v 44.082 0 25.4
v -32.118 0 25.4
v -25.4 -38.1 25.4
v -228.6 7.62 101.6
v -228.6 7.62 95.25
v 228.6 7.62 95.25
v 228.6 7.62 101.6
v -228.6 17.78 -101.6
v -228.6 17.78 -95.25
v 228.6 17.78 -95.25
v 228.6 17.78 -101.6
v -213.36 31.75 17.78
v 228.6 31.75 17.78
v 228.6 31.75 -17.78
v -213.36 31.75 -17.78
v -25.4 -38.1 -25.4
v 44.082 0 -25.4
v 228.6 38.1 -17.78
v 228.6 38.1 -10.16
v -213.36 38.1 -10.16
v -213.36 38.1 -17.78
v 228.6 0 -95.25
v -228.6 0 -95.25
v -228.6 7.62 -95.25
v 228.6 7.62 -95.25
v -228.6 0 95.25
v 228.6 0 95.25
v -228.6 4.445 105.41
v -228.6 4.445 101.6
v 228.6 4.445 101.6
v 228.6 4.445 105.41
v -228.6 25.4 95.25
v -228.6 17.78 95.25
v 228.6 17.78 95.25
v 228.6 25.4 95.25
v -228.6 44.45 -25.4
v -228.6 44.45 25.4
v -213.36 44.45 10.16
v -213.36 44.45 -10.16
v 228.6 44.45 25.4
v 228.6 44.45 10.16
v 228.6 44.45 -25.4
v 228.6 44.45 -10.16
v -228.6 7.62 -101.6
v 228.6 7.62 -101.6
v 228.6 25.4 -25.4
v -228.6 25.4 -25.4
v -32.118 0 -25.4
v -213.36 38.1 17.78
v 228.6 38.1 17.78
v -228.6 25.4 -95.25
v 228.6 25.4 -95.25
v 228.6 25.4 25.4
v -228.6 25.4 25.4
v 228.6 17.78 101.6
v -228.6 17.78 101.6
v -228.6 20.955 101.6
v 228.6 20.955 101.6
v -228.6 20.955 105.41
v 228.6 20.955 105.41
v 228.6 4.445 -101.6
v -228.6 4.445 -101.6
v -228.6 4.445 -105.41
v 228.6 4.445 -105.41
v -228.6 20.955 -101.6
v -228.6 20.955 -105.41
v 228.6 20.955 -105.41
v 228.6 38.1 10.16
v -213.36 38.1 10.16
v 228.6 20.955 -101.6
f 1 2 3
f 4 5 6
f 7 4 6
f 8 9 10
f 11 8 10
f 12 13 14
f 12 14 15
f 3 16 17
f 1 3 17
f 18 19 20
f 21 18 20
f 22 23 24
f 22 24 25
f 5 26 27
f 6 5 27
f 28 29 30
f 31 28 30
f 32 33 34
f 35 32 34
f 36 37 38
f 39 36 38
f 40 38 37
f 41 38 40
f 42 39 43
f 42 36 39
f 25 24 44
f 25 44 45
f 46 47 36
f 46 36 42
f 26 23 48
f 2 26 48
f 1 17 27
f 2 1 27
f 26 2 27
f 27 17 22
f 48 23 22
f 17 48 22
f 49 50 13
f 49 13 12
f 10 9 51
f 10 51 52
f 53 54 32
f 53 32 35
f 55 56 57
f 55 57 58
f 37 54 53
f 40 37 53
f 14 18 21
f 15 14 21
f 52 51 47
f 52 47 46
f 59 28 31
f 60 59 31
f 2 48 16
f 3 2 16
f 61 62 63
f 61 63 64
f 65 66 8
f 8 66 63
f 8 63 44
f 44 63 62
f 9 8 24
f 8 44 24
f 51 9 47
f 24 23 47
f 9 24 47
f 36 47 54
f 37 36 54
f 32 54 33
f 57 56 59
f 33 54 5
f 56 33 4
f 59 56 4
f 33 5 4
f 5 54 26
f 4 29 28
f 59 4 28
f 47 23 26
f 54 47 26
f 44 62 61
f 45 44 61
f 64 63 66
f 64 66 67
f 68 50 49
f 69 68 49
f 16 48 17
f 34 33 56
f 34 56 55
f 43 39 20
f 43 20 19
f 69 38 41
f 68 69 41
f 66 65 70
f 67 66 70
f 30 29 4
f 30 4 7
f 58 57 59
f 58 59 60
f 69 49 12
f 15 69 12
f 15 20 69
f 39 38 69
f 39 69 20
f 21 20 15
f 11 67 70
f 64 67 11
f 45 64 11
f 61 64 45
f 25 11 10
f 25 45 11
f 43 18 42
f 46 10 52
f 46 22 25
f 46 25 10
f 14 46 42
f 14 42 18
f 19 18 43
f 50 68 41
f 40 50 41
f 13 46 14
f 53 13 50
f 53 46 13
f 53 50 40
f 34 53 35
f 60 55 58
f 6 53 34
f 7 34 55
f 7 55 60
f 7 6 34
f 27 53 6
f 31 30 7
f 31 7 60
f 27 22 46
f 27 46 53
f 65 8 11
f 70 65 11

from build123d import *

# Parameters (mm, degrees)
SKETCH1_W                = 457.2
SKETCH1_H                = 190.5
BOSS_EXTRUDE1_DEPTH      = 25.4
SKETCH2_W                = 457.2
SKETCH2_H                = 10.16
BOSS_EXTRUDE2_DEPTH      = 10.16
BOSS_EXTRUDE3_START      = -13.335
SKETCH3_W                = 457.2
SKETCH3_H                = 3.81
BOSS_EXTRUDE3_DEPTH      = 16.51
SKETCH5_W                = 457.2
SKETCH5_H                = 50.8
BOSS_EXTRUDE4_DEPTH      = 19.05
SKETCH6_W                = 441.96
SKETCH6_H                = 20.32
CUT_EXTRUDE1_DEPTH       = 12.7
CUT_EXTRUDE2_DEPTH       = 27.94
CUT_EXTRUDE2_DEPTH_BACK  = 7.62
SKETCH7_W                = 441.96
SKETCH7_H                = 6.35
BOSS_EXTRUDE5_DEPTH      = 25.4
BOSS_EXTRUDE5_DEPTH_BACK = 25.4


with BuildPart() as part:
    # Sketch1 → Boss-Extrude1 (new body)
    with BuildSketch(Plane(origin=(0, 0, 0), x_dir=(1, 0, 0), z_dir=(0, 1, 0))):
        Rectangle(SKETCH1_W, SKETCH1_H)
    extrude(amount=BOSS_EXTRUDE1_DEPTH)

    # Sketch2 → Boss-Extrude2 (add)
    with BuildSketch(Plane.XY.offset(95.25)):
        with Locations((0, 12.7)):
            Rectangle(SKETCH2_W, SKETCH2_H)
    boss_extrude2 = extrude(amount=BOSS_EXTRUDE2_DEPTH)

    # Sketch3 → Boss-Extrude3 (add)
    with BuildSketch(Plane(origin=(0, 17.78, 0), x_dir=(1, 0, 0), z_dir=(0, 1, 0)).offset(BOSS_EXTRUDE3_START)):
        with Locations((0, -103.505)):
            Rectangle(SKETCH3_W, SKETCH3_H)
    boss_extrude3 = extrude(amount=BOSS_EXTRUDE3_DEPTH)

    # Mirror1: Boss-Extrude2, Boss-Extrude3 across plane
    add(boss_extrude2.mirror(Plane.XY))
    add(boss_extrude3.mirror(Plane.XY))

    # Sketch5 → Boss-Extrude4 (add)
    with BuildSketch(Plane(origin=(0, 25.4, 0), x_dir=(1, 0, 0), z_dir=(0, 1, 0))):
        Rectangle(SKETCH5_W, SKETCH5_H)
    extrude(amount=BOSS_EXTRUDE4_DEPTH)

    # Sketch6 → Cut-Extrude1 (cut)
    with BuildSketch(Plane(origin=(0, 44.45, 0), x_dir=(1, 0, 0), z_dir=(0, 1, 0))):
        with Locations((7.62, 0)):
            Rectangle(SKETCH6_W, SKETCH6_H)
    extrude(amount=-CUT_EXTRUDE1_DEPTH, mode=Mode.SUBTRACT)

    # Sketch7 → Cut-Extrude2 (cut, two sides: drawn at the far end of the back side and taken through both)
    with BuildSketch(Plane(origin=(0, 0, 10.16), x_dir=(-1, 0, 0), z_dir=(0, 0, -1)).offset(-CUT_EXTRUDE2_DEPTH_BACK)):
        with Locations((-7.62, 34.925)):
            Rectangle(SKETCH7_W, SKETCH7_H)
    extrude(amount=CUT_EXTRUDE2_DEPTH + CUT_EXTRUDE2_DEPTH_BACK, mode=Mode.SUBTRACT)

    # Sketch8 → Boss-Extrude5 (add, two sides: drawn at the far end of the back side and taken through both)
    with BuildSketch(Plane.XY.offset(-BOSS_EXTRUDE5_DEPTH_BACK)):
        Polygon((44.081942035, 0), (-32.118057965, 0), (-25.4, -38.1), align=None)
    extrude(amount=BOSS_EXTRUDE5_DEPTH + BOSS_EXTRUDE5_DEPTH_BACK)


solid = part.part
